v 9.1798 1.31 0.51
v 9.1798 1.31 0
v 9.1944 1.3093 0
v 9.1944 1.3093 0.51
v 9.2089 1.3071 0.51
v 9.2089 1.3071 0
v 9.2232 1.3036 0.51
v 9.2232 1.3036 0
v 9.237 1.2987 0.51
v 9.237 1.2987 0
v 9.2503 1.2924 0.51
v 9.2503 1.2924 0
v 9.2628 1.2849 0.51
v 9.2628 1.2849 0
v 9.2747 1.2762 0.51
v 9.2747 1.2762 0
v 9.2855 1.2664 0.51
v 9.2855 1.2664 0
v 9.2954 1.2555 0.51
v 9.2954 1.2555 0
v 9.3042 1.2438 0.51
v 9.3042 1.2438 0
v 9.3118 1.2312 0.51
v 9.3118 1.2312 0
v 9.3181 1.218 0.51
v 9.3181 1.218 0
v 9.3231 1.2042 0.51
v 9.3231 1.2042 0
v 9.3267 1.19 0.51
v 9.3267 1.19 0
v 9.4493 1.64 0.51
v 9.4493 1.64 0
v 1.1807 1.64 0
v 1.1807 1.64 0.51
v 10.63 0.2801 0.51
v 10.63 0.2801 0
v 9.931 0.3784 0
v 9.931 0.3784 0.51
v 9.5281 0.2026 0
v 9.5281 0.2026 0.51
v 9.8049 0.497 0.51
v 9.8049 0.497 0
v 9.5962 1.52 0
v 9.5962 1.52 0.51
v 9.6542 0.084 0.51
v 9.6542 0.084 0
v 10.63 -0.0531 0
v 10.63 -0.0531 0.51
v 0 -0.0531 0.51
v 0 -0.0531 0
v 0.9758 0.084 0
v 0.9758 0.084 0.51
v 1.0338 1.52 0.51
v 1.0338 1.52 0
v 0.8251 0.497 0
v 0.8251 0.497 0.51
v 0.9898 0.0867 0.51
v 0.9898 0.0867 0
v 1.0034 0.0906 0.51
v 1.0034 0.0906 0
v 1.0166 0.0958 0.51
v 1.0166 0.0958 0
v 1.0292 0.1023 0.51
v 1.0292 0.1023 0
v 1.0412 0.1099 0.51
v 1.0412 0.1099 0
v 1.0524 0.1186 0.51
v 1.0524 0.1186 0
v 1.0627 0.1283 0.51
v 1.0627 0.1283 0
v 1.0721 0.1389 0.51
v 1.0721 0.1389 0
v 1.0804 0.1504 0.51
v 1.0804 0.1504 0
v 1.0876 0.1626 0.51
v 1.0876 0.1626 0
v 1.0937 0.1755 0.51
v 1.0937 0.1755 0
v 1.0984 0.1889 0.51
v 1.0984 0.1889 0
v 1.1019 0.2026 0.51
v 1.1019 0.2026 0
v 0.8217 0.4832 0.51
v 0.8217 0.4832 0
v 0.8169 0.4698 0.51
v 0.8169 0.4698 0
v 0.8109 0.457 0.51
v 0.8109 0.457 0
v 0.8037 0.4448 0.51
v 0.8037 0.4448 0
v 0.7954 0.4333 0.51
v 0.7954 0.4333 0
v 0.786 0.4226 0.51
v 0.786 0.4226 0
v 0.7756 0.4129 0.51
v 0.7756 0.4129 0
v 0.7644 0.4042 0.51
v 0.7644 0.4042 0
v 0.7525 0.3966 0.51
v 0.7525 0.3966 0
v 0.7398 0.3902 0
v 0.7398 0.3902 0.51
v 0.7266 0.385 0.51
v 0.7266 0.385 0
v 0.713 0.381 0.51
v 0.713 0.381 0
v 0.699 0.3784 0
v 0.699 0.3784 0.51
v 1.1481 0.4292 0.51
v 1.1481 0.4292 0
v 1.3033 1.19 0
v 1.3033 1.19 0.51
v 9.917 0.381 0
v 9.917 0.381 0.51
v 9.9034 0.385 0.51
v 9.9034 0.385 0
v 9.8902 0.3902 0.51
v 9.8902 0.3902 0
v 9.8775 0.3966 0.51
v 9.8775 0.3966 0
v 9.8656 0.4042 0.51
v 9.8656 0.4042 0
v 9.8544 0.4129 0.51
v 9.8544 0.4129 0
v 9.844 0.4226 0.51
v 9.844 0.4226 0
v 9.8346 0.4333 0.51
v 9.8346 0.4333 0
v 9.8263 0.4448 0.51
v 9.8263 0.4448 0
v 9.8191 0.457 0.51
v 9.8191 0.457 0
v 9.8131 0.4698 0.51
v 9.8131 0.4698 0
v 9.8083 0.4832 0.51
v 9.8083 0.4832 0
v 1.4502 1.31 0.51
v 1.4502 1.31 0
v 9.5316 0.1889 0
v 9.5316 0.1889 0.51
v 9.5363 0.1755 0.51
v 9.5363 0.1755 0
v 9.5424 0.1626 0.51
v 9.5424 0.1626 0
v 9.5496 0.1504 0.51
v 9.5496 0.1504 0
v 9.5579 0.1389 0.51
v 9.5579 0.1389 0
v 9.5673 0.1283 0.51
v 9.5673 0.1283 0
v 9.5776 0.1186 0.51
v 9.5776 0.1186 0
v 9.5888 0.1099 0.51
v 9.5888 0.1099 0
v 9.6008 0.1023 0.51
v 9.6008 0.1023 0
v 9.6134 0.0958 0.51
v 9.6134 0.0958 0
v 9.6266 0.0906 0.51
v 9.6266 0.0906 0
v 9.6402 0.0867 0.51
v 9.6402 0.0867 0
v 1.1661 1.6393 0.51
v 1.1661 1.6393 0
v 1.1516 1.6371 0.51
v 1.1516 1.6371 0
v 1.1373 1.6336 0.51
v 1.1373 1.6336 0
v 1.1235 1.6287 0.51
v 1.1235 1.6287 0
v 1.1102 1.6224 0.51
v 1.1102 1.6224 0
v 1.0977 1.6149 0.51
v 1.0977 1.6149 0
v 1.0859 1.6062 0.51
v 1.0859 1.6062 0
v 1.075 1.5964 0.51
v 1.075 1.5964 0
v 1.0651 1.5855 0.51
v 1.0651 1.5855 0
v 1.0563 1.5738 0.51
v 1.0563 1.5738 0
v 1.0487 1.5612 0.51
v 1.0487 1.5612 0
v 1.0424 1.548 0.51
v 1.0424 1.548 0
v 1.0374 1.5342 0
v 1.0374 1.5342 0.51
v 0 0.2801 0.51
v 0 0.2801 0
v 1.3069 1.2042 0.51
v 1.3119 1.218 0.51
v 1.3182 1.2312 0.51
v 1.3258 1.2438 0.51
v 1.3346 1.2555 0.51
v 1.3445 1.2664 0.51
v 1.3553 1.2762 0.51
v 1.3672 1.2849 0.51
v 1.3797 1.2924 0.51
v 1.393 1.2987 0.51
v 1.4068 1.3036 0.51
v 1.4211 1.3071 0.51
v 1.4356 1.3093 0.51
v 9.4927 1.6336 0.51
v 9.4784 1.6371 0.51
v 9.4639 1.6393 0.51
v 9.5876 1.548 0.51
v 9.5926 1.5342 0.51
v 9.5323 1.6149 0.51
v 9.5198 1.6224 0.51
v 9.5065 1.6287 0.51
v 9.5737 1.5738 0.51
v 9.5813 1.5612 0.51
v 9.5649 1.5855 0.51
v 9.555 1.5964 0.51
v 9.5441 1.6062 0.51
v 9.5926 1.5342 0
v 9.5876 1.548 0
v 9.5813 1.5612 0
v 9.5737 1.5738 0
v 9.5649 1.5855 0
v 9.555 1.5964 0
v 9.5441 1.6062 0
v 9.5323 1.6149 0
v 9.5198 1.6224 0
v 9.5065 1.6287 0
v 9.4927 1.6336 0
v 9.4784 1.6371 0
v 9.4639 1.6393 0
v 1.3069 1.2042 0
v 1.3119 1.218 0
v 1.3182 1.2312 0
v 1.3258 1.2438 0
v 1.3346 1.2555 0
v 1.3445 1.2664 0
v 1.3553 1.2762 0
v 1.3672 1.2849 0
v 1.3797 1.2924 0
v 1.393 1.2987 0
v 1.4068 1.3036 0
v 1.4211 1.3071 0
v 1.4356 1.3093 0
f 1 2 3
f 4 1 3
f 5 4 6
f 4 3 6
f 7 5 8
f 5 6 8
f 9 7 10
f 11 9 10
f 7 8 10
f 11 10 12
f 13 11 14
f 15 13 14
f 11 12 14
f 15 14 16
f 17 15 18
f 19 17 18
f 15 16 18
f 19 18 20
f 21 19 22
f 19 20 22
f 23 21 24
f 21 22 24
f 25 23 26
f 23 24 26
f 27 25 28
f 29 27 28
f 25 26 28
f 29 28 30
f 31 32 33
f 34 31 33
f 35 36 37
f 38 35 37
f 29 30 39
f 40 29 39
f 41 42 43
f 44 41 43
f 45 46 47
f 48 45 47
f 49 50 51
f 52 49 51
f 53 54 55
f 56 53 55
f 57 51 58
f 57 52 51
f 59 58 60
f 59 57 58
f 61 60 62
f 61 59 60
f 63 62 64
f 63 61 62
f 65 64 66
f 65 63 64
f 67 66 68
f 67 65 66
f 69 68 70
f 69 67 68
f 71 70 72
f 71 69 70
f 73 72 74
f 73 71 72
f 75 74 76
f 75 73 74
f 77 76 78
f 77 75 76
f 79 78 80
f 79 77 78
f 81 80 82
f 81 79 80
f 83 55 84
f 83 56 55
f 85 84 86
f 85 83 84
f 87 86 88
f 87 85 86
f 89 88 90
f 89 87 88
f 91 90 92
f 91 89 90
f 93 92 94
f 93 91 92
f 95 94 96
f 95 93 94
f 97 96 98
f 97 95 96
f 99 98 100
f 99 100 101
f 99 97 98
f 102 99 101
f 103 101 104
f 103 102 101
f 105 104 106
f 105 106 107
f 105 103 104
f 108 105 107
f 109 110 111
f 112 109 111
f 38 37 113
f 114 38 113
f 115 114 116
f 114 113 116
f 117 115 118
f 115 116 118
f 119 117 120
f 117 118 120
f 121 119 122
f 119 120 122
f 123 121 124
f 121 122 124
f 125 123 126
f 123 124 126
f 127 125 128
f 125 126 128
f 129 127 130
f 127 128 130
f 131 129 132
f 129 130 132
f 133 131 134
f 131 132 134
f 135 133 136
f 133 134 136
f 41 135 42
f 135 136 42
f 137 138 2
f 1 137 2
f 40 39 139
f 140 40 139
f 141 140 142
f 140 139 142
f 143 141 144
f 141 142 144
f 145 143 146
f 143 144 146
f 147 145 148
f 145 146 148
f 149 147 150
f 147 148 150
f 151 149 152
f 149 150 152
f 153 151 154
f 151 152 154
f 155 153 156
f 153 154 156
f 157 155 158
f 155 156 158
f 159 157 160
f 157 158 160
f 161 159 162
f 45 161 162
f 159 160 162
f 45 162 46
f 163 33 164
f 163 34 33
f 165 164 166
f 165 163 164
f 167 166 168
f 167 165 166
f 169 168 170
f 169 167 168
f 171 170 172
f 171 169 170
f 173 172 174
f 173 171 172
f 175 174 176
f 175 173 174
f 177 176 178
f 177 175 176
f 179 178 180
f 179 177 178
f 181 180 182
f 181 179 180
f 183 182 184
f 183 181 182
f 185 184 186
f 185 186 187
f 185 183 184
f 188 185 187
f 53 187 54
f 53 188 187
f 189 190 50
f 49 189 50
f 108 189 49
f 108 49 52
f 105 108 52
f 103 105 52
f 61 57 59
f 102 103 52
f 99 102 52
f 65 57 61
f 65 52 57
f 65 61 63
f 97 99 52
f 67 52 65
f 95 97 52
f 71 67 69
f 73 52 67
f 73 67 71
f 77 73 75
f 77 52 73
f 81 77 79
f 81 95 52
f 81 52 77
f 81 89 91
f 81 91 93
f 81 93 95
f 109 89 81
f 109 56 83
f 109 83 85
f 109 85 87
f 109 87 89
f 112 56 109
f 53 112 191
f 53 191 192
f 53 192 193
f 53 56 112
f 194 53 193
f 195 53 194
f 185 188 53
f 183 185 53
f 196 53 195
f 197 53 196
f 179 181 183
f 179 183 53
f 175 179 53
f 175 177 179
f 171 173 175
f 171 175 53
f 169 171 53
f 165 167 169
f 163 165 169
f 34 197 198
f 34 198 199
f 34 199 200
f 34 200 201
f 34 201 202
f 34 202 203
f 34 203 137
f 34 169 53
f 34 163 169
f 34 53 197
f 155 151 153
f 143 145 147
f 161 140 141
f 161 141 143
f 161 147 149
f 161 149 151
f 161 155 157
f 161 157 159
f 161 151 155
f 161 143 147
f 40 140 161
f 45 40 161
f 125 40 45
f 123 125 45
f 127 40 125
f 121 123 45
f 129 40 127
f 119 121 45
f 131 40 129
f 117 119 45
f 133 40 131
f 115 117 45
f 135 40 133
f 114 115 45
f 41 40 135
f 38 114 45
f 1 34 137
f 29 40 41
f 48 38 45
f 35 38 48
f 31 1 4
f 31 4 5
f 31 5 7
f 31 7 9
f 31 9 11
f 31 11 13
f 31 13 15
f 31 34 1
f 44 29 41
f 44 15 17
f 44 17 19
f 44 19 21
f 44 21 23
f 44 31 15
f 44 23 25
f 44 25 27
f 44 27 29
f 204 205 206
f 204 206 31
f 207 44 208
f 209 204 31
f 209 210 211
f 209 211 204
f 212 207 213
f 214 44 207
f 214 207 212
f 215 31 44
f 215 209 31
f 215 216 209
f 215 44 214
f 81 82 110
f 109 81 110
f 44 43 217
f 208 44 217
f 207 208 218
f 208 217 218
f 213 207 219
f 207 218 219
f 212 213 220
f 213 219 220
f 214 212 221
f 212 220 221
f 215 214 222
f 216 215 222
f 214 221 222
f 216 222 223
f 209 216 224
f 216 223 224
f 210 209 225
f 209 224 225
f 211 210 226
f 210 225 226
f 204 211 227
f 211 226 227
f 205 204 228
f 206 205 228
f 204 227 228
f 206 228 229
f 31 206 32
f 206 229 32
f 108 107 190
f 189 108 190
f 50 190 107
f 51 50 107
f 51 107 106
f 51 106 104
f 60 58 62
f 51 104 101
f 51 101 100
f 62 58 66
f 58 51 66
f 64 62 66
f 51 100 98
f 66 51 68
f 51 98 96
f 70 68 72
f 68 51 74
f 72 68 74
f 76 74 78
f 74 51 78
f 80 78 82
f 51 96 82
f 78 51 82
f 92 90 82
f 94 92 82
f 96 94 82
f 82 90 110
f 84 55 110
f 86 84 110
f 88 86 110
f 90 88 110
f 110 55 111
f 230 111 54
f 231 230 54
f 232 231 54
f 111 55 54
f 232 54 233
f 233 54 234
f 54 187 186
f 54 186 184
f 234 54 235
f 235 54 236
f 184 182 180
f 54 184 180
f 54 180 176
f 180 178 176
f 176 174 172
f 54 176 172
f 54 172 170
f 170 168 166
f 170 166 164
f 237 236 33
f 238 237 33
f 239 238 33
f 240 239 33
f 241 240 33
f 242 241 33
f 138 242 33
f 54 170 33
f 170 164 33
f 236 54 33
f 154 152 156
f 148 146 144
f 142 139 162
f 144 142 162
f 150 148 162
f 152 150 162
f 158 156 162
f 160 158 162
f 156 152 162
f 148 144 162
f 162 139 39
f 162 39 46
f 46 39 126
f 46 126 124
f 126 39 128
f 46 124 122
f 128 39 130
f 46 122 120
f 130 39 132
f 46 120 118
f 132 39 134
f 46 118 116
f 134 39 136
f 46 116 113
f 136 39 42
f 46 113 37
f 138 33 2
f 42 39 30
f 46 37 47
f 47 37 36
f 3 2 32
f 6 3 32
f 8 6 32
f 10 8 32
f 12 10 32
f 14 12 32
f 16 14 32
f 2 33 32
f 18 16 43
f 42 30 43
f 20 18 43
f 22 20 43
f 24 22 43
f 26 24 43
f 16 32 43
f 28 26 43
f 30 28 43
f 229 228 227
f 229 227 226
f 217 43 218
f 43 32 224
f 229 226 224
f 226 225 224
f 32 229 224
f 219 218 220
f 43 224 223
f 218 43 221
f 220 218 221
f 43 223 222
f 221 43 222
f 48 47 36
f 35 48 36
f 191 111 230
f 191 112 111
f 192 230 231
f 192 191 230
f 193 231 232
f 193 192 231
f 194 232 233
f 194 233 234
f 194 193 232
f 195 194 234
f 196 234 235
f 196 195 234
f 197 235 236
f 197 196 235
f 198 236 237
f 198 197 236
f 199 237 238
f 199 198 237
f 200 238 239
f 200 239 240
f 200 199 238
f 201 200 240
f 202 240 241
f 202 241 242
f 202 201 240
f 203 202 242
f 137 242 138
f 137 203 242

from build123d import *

# Parameters (mm, degrees)
BOSS_EXTRUDE1_DEPTH  = 0.51
FILLET2_R            = 0.15
SKETCH3_W            = 0.51
SKETCH3_H            = 0.33
BOSS_EXTRUDE2_DEPTH  = 3.8
FILLET2_OF_MIRROR2_R = 0.15


with BuildPart() as part:
    # Sketch2 → Boss-Extrude1 (new body)
    with BuildSketch(Plane.XY):
        Polygon((0, 0.280138432), (0, 0), (0, -0.053104667), (1.080748407, 0.098784616), (1.148133843, 0.429247456), (1.327730115, 1.31), (1.515, 1.31), (1.515, 1.64), (1.058230308, 1.64), (0.803978227, 0.393130203), align=None)
    boss_extrude1 = extrude(amount=BOSS_EXTRUDE1_DEPTH)

    # Fillet2
    fillet2_edges = [part.edges().sort_by_distance(p)[0] for p in [
        (1.058230308, 1.64, 0.255),
        (1.327730115, 1.31, 0.255),
        (1.080748407, 0.098784616, 0.255),
        (0.803978227, 0.393130203, 0.255),
    ]]
    fillet(fillet2_edges, radius=FILLET2_R)

    # Sketch3 → Boss-Extrude2 (add)
    with BuildSketch(Plane(origin=(1.515, 0, 0), x_dir=(0, 0, -1), z_dir=(1, 0, 0))):
        with Locations((-0.255, 1.475)):
            Rectangle(SKETCH3_W, SKETCH3_H)
    boss_extrude2 = extrude(amount=BOSS_EXTRUDE2_DEPTH)

    # Mirror2: Boss-Extrude1, Boss-Extrude2 across plane
    add(boss_extrude1.mirror(Plane(origin=(5.315, 0, 0), x_dir=(0, 0, 1), z_dir=(1, 0, 0))))
    add(boss_extrude2.mirror(Plane(origin=(5.315, 0, 0), x_dir=(0, 0, 1), z_dir=(1, 0, 0))))

    # Fillet2 of Mirror2
    fillet2_of_mirror2_edges = [part.edges().sort_by_distance(p)[0] for p in [
        (9.571769692, 1.64, 0.255),
        (9.302269885, 1.31, 0.255),
        (9.549251593, 0.098784616, 0.255),
        (9.826021773, 0.393130203, 0.255),
    ]]
    fillet(fillet2_of_mirror2_edges, radius=FILLET2_OF_MIRROR2_R)


solid = part.part
